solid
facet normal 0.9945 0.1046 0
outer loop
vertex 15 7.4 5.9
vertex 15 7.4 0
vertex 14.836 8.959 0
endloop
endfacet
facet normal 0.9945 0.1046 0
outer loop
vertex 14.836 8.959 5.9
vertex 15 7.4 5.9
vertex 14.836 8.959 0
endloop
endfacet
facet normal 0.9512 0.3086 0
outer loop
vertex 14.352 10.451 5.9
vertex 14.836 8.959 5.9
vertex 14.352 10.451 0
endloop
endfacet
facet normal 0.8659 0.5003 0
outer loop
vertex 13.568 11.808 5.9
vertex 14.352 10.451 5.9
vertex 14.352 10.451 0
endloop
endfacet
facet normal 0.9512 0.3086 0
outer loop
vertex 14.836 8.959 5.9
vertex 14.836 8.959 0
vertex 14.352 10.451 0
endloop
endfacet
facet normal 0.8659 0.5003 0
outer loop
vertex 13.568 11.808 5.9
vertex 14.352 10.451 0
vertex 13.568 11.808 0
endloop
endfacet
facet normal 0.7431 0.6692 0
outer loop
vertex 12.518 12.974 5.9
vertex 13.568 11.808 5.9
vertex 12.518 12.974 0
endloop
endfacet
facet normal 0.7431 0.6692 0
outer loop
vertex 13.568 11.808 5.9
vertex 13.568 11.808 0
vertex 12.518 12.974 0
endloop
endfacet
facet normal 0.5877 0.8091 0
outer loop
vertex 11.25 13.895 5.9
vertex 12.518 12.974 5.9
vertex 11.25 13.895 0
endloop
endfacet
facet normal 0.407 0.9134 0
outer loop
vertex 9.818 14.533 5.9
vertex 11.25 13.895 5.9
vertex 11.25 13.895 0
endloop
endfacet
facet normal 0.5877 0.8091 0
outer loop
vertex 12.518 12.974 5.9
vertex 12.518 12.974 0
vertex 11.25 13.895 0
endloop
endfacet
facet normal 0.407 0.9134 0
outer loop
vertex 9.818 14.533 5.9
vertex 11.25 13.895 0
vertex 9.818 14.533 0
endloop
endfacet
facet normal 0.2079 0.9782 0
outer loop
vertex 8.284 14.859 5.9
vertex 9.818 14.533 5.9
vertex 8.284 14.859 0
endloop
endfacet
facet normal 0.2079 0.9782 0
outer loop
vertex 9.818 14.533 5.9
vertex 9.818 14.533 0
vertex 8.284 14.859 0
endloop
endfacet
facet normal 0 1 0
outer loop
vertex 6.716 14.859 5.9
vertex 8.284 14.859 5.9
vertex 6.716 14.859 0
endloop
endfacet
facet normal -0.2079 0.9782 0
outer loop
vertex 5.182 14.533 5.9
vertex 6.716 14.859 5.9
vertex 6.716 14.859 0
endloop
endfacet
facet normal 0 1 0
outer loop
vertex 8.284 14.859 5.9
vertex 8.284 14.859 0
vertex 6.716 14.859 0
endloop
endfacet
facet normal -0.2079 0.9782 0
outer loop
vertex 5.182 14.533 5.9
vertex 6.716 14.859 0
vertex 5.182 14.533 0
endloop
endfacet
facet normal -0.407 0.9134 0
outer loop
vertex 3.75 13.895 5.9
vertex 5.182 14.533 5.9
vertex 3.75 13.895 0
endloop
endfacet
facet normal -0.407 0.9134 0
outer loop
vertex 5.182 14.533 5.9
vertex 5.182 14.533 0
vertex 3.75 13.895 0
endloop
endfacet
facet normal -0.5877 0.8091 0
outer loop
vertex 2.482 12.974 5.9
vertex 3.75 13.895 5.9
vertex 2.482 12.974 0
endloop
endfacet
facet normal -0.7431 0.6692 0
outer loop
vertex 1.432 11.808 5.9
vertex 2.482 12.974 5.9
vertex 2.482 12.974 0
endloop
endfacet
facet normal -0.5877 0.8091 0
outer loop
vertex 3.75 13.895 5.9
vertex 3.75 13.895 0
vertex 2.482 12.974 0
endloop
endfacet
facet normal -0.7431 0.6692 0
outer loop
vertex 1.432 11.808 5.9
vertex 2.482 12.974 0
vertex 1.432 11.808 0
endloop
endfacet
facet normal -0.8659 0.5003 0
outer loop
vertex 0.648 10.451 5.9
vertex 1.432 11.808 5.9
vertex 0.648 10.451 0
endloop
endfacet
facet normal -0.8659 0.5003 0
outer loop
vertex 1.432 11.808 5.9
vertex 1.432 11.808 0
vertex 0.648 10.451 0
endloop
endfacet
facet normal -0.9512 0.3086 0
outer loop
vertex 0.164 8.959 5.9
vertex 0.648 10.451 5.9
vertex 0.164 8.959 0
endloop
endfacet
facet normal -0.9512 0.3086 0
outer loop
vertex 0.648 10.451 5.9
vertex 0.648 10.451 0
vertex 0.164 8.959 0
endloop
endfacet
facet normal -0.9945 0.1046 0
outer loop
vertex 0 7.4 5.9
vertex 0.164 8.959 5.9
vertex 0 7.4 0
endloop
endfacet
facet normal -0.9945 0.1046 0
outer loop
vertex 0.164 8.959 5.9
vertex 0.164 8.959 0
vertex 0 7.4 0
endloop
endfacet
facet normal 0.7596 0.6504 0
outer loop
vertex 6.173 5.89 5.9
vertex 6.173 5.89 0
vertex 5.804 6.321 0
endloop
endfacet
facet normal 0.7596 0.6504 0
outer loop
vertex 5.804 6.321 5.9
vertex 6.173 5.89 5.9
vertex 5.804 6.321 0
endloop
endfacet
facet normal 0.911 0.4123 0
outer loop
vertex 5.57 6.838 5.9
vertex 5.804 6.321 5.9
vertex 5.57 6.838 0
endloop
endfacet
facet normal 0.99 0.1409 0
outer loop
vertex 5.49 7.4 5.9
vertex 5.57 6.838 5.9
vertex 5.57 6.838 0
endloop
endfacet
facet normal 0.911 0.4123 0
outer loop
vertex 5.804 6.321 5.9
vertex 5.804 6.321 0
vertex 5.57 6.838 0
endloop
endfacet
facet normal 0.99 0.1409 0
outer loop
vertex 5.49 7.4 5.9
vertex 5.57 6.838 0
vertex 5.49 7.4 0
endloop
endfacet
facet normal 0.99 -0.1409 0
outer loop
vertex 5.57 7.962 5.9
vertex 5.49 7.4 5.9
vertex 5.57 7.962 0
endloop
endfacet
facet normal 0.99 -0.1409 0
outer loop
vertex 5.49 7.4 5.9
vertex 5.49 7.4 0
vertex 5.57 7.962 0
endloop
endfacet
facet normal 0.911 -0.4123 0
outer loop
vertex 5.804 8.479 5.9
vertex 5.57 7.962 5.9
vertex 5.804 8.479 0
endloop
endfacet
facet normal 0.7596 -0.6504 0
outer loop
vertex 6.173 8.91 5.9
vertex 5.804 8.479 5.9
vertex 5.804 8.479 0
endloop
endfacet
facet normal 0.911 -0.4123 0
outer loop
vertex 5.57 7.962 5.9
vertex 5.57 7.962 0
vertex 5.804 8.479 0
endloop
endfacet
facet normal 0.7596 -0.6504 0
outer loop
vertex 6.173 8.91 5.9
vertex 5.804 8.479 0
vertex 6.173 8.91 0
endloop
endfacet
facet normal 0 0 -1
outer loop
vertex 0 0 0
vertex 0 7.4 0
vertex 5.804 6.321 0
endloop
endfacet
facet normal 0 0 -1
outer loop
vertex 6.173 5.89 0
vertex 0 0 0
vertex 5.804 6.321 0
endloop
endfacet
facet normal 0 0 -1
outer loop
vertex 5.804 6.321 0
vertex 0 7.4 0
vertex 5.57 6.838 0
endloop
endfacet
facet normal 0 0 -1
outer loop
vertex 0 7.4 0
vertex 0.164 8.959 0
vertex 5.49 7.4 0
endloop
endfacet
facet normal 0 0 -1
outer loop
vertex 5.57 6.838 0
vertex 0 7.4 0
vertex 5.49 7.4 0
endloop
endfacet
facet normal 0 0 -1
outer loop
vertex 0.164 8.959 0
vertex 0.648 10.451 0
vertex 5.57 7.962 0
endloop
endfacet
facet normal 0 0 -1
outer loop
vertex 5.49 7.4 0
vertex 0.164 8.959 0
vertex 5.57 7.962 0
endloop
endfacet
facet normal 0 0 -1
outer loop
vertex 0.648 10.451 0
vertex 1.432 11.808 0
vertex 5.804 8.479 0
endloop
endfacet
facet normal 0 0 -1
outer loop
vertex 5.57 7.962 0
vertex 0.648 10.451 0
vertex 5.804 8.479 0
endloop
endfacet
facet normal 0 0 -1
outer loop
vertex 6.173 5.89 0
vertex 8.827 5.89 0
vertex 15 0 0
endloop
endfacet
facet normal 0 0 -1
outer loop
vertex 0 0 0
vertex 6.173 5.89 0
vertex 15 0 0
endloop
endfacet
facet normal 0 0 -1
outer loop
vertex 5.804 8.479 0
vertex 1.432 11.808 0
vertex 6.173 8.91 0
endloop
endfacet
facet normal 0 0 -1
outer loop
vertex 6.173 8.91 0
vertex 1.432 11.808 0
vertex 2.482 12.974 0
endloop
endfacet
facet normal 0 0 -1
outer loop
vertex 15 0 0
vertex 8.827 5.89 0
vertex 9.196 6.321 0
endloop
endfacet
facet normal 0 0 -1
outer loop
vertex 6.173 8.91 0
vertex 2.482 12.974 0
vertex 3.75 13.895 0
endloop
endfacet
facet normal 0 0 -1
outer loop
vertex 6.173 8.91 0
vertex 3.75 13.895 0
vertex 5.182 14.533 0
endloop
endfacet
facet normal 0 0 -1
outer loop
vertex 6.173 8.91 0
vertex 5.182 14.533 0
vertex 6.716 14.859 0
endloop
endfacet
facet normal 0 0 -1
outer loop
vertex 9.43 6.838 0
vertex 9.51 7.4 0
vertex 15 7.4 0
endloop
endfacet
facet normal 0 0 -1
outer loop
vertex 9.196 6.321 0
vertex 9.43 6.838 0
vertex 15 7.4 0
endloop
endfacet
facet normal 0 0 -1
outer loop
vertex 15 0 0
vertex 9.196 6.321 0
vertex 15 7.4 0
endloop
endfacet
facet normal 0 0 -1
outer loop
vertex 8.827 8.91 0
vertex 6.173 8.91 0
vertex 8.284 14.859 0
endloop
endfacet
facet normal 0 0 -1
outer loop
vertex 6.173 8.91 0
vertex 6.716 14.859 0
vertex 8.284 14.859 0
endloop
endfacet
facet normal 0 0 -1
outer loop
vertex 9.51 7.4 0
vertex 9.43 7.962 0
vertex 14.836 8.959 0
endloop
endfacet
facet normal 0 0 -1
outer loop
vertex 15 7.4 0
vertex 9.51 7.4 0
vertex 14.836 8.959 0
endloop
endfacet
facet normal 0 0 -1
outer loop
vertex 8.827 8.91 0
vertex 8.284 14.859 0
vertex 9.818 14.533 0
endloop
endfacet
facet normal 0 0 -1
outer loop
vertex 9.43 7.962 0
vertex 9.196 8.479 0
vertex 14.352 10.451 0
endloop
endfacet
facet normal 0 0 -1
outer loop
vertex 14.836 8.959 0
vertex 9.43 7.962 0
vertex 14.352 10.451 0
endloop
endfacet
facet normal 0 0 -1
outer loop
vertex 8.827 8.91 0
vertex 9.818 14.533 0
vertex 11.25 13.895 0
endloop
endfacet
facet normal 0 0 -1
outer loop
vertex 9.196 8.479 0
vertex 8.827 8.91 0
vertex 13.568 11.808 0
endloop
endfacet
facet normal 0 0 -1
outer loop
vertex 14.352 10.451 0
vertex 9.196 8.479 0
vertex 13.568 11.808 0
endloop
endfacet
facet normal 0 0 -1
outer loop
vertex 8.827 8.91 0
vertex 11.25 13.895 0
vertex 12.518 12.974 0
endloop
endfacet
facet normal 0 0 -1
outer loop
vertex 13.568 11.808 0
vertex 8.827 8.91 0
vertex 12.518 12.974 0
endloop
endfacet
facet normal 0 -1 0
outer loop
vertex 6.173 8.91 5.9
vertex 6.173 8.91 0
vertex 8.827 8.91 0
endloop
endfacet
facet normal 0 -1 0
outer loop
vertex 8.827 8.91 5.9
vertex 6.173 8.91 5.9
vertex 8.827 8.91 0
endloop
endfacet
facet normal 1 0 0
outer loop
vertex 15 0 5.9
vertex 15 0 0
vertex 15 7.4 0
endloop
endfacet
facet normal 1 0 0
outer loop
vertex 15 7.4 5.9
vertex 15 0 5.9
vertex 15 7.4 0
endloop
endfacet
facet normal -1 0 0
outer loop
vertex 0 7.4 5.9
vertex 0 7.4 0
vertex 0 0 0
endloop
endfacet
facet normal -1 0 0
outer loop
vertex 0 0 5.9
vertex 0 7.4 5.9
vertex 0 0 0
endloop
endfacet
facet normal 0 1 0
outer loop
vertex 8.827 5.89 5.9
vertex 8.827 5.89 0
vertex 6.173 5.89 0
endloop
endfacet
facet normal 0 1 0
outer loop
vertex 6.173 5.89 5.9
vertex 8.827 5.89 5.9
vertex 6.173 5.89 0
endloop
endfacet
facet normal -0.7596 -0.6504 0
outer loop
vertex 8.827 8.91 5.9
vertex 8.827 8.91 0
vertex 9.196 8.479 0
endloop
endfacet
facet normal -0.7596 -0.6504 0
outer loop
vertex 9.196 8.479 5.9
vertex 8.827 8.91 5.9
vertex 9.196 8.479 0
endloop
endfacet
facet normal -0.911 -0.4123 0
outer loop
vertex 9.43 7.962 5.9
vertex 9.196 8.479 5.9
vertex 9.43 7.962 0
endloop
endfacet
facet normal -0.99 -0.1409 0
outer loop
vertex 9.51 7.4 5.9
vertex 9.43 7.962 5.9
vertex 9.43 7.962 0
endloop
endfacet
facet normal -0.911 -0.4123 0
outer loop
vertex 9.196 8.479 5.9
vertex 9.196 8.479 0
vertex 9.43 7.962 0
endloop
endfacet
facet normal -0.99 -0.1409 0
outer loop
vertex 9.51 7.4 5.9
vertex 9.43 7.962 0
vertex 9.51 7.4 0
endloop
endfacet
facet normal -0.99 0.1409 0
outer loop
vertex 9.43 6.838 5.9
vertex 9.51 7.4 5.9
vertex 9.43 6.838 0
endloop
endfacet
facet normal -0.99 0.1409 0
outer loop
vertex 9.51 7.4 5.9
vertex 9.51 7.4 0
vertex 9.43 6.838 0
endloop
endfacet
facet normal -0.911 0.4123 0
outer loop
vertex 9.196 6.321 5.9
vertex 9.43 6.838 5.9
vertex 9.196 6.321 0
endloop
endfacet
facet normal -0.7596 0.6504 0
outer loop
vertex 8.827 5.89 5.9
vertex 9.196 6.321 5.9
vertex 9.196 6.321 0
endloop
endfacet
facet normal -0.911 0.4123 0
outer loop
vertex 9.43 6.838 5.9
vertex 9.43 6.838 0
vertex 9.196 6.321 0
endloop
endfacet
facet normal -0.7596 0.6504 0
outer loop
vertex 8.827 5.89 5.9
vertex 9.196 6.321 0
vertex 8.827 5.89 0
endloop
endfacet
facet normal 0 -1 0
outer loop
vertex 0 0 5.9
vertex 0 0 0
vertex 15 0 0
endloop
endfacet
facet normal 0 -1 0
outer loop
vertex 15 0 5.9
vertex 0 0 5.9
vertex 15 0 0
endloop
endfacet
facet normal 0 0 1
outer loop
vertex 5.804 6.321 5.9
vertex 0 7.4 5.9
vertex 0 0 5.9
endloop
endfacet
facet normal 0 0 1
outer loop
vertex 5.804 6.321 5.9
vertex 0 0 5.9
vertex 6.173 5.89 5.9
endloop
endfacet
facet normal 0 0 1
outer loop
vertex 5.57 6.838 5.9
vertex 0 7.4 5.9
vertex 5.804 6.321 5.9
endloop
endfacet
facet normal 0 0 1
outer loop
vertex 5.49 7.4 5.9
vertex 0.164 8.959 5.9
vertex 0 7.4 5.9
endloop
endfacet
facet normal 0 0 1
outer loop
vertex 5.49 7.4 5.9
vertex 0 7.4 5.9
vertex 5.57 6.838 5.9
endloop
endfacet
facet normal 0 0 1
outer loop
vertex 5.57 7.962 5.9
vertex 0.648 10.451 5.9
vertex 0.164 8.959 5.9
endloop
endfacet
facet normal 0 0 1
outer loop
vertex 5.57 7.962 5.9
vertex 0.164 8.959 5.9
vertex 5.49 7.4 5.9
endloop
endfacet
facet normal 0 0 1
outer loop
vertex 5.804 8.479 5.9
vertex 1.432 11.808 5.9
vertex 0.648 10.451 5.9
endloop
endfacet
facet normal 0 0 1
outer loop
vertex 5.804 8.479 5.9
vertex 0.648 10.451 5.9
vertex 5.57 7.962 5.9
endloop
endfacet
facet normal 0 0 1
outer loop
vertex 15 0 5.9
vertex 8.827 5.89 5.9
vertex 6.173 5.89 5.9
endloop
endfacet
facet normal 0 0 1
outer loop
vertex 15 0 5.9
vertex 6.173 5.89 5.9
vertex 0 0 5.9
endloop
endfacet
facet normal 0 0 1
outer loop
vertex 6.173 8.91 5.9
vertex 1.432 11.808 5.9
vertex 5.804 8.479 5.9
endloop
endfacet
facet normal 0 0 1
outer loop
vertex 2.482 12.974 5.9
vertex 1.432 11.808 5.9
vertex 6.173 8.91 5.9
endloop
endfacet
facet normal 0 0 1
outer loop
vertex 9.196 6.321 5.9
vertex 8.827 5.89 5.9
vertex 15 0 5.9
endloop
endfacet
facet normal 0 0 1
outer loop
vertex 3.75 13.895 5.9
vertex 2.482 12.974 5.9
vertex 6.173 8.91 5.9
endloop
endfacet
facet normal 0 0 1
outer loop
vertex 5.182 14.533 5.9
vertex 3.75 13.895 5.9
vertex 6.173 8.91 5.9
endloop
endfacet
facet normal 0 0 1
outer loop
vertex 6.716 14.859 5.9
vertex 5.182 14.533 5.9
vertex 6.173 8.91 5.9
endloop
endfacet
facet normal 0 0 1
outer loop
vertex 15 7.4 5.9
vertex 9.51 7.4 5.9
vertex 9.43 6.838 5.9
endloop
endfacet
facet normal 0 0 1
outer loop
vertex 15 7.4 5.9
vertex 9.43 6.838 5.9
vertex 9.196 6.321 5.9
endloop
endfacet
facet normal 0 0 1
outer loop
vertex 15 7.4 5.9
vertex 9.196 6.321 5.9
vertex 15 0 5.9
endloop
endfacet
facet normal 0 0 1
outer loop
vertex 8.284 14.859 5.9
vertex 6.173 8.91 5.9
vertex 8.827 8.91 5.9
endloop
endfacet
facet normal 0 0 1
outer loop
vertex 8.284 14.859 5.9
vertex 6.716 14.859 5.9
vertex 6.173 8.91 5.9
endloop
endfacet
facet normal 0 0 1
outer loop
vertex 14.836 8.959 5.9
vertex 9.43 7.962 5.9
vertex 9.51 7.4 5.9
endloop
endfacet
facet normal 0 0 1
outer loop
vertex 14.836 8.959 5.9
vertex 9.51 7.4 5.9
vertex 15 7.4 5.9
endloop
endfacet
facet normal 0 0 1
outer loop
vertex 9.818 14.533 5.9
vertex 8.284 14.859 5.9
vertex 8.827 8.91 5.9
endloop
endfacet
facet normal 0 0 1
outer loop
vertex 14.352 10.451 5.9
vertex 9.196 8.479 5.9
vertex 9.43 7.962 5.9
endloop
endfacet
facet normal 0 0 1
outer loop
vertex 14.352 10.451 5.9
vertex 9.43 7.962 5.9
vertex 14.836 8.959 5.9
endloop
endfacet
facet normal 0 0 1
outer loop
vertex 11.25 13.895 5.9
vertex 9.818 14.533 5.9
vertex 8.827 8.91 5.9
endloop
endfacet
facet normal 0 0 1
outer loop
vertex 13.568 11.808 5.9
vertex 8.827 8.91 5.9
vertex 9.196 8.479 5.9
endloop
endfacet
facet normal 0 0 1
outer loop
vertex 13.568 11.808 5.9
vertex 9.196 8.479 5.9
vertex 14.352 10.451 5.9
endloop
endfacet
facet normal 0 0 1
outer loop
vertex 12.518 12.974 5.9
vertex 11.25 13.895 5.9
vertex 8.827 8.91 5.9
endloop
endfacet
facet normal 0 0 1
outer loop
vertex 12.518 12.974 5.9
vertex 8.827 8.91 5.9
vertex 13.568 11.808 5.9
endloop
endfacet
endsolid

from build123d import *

# Parameters (mm, degrees)
EXTRUSION1_DEPTH = 5.9


with BuildPart() as part:
    # Esquisse1 → Extrusion1 (new body)
    with BuildSketch(Plane.XY):
        with BuildLine():
            Line((0, 0), (15, 0))
            Line((15, 0), (15, 7.4))
            ThreePointArc((15, 7.4), (7.5, 14.9), (0, 7.4))
            Line((0, 7.4), (0, 0))
        make_face()
        with BuildLine():
            Line((6.173350084, 8.91), (8.826649916, 8.91))
            ThreePointArc((8.826649916, 8.91), (9.51, 7.4), (8.826649916, 5.89))
            Line((8.826649916, 5.89), (6.173350084, 5.89))
            ThreePointArc((6.173350084, 5.89), (5.49, 7.4), (6.173350084, 8.91))
        make_face(mode=Mode.SUBTRACT)
    extrude(amount=EXTRUSION1_DEPTH)


solid = part.part
